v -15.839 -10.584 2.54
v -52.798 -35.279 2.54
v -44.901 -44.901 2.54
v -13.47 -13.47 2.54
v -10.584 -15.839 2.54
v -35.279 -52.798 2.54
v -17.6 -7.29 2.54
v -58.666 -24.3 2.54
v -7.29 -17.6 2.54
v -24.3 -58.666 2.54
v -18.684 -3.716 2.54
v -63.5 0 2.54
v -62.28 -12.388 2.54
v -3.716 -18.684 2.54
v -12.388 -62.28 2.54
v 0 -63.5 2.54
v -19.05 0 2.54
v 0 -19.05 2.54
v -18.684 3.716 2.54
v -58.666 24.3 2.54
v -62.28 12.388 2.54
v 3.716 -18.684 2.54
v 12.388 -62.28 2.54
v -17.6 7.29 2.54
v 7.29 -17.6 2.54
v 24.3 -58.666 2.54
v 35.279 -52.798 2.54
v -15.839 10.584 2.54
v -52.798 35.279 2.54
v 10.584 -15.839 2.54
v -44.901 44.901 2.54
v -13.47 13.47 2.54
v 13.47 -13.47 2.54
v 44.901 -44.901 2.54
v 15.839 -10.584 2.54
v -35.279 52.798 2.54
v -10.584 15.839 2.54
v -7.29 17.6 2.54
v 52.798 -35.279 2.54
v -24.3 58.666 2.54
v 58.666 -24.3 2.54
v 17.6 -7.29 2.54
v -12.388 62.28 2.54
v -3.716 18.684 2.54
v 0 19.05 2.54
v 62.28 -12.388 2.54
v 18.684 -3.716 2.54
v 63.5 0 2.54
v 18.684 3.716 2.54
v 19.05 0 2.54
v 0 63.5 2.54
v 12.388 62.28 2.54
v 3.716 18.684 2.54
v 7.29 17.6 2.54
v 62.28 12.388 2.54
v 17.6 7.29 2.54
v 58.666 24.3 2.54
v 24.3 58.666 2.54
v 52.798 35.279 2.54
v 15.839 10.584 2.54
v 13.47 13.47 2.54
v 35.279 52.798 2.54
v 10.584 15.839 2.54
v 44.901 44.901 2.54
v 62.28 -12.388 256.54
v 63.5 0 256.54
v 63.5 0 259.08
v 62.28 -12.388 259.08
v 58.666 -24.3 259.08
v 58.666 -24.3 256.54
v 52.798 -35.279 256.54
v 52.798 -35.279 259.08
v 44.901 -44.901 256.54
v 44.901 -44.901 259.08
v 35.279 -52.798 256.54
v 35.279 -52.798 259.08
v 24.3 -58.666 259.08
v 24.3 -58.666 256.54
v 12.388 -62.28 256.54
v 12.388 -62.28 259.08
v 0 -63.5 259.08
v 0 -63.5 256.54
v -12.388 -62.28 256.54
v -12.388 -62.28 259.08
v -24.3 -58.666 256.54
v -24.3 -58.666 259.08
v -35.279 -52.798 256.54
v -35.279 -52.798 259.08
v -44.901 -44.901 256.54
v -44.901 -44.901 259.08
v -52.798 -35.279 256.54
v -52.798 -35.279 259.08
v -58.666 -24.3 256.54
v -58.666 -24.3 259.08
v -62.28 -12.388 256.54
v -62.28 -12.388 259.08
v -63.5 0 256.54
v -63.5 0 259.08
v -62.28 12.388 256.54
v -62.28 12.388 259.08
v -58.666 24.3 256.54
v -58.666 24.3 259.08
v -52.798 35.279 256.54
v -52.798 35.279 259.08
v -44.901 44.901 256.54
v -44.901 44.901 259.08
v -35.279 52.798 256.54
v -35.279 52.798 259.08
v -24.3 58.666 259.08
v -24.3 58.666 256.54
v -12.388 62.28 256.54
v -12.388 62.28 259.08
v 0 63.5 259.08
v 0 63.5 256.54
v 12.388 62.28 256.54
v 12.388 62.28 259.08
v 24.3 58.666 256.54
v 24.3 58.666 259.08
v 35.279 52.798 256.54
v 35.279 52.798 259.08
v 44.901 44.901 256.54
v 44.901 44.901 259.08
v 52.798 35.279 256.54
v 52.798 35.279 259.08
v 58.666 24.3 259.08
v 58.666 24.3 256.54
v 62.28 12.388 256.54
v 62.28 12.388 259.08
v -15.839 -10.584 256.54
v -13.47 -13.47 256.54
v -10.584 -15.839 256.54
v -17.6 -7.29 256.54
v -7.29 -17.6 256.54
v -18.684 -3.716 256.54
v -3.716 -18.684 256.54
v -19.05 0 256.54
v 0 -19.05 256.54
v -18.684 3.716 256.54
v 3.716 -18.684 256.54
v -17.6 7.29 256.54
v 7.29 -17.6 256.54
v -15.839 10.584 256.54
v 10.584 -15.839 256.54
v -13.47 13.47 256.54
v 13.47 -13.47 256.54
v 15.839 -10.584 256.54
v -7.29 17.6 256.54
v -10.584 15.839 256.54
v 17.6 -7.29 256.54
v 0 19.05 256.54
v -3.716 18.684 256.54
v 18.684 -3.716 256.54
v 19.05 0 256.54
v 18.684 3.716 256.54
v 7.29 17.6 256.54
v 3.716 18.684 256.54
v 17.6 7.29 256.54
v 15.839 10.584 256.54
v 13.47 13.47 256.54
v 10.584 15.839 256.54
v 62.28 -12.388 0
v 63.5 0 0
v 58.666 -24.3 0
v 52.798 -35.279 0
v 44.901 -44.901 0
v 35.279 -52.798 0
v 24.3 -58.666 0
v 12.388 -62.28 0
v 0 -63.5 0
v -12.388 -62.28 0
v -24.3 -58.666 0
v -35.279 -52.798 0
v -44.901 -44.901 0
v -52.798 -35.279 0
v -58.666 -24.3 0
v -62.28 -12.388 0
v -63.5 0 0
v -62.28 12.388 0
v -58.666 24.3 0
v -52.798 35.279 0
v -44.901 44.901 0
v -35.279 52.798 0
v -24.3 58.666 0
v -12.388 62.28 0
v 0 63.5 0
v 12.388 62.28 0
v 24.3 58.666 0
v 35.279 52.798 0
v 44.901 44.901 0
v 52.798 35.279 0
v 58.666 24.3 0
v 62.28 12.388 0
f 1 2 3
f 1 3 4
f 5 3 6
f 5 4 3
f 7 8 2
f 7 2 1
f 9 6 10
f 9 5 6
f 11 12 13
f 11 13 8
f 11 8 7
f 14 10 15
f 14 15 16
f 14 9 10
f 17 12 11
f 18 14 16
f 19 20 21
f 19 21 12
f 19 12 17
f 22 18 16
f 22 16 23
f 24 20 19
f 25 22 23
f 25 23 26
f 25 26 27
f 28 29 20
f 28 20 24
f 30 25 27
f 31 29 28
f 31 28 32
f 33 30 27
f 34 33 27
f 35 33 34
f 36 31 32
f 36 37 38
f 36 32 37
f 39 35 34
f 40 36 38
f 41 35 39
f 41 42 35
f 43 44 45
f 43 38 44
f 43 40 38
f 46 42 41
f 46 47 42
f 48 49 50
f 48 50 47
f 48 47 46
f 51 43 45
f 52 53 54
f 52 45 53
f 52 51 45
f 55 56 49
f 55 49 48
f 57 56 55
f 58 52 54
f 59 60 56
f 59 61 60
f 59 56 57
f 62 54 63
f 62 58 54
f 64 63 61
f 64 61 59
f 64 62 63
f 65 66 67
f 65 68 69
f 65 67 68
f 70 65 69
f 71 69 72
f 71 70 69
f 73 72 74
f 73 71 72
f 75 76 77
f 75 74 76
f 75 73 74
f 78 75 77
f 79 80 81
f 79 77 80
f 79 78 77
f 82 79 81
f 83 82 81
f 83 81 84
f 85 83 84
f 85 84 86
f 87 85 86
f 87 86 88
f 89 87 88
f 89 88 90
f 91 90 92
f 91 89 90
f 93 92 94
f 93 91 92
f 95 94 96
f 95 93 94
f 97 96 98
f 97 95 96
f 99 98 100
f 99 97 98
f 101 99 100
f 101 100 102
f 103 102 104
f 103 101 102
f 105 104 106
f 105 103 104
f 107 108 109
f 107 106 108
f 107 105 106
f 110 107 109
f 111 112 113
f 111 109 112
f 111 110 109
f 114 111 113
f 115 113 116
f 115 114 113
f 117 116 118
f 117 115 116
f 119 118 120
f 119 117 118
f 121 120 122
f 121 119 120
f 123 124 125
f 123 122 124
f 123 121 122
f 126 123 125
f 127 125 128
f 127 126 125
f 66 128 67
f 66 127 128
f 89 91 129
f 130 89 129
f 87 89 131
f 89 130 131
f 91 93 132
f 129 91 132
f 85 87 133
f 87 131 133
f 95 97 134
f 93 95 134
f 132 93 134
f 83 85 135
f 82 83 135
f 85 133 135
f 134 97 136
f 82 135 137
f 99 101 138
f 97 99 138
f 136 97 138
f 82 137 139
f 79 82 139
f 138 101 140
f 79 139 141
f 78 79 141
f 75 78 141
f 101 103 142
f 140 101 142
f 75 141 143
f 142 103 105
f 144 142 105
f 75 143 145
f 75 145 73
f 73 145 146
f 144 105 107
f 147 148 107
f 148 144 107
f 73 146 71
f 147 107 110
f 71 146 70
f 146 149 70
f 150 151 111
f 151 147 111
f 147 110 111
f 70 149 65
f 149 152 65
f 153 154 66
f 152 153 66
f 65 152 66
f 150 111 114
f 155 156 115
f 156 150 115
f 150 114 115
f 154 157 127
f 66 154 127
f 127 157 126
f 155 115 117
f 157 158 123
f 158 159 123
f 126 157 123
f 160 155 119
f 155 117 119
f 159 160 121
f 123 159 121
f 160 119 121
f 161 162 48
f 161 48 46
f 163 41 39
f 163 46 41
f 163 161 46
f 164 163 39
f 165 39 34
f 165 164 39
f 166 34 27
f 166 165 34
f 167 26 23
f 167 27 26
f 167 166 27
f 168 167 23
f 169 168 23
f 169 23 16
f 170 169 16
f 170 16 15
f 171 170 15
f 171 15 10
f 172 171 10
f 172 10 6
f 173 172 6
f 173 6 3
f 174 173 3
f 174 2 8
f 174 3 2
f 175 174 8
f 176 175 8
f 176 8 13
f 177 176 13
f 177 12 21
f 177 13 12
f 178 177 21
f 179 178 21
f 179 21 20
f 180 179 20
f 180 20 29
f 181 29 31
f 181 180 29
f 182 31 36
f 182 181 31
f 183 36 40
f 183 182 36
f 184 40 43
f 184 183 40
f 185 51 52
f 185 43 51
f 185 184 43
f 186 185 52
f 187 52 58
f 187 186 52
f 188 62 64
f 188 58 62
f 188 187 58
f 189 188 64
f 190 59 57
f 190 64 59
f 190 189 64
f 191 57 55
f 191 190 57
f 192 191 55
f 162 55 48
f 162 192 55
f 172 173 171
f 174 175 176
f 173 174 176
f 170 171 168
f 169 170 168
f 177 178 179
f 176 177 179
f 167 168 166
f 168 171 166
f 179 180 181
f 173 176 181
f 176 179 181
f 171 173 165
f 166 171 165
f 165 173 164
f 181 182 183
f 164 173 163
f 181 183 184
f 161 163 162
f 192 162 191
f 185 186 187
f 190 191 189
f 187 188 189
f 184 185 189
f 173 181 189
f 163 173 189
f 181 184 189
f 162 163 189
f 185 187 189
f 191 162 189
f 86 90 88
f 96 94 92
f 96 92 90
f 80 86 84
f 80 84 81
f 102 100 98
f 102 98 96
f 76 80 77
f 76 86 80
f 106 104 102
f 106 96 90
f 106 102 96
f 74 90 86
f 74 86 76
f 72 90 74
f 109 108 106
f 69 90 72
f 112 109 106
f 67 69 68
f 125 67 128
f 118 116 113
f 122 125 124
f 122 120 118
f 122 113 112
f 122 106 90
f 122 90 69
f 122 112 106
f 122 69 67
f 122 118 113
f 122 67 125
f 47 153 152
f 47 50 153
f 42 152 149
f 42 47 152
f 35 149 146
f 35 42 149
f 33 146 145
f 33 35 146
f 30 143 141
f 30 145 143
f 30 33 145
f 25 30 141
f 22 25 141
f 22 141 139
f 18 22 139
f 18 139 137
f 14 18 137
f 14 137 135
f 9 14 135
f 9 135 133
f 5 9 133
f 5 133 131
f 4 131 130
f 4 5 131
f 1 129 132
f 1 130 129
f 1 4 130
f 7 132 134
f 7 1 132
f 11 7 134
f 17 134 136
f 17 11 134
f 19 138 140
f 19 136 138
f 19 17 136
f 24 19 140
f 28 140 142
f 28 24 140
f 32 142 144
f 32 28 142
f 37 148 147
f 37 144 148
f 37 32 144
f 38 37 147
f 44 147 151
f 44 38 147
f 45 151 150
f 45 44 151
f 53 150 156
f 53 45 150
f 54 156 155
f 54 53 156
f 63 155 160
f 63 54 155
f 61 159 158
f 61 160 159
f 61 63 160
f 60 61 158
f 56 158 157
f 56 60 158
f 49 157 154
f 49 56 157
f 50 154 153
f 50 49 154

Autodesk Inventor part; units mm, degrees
ref_plane "YZ Plane" through (0, 0, 0) normal (1, 0, 0) x (0, 1, 0)
ref_plane "XZ Plane" through (0, 0, 0) normal (0, 1, 0) x (-1, 0, 0)
ref_plane "XY Plane" through (0, 0, 0) normal (0, 0, 1) x (1, 0, 0)
sketch "Sketch1" plane through (0, 0, 0) normal (0, 0, 1) x (1, 0, 0)
  circle A0 centre (0, 0) radius 63.5
  dimension "d0" = 127
extrude "Extrusion1" add sketch "Sketch1" along normal blind 2.54
sketch "Sketch2" plane through (0, 0, 2.54) normal (0, 0, 1) x (1, 0, 0)
  circle A0 centre (0, 0) radius 63.5 projected
  circle A1 centre (0, 0) radius 19.05
  dimension "d3" = 38.1
extrude "Extrusion2" add sketch "Sketch2" along normal blind 254 contours A1
sketch "Sketch3" plane through (0, 0, 256.54) normal (0, 0, 1) x (1, 0, 0)
  circle A0 centre (0, 0) radius 19.05 projected
  circle A1 centre (0, 0) radius 63.5
  dimension "d6" = 127
extrude "Extrusion3" add sketch "Sketch3" along normal blind 2.54 contours A0 | A1
properties part number "A solid metal acylinder"
